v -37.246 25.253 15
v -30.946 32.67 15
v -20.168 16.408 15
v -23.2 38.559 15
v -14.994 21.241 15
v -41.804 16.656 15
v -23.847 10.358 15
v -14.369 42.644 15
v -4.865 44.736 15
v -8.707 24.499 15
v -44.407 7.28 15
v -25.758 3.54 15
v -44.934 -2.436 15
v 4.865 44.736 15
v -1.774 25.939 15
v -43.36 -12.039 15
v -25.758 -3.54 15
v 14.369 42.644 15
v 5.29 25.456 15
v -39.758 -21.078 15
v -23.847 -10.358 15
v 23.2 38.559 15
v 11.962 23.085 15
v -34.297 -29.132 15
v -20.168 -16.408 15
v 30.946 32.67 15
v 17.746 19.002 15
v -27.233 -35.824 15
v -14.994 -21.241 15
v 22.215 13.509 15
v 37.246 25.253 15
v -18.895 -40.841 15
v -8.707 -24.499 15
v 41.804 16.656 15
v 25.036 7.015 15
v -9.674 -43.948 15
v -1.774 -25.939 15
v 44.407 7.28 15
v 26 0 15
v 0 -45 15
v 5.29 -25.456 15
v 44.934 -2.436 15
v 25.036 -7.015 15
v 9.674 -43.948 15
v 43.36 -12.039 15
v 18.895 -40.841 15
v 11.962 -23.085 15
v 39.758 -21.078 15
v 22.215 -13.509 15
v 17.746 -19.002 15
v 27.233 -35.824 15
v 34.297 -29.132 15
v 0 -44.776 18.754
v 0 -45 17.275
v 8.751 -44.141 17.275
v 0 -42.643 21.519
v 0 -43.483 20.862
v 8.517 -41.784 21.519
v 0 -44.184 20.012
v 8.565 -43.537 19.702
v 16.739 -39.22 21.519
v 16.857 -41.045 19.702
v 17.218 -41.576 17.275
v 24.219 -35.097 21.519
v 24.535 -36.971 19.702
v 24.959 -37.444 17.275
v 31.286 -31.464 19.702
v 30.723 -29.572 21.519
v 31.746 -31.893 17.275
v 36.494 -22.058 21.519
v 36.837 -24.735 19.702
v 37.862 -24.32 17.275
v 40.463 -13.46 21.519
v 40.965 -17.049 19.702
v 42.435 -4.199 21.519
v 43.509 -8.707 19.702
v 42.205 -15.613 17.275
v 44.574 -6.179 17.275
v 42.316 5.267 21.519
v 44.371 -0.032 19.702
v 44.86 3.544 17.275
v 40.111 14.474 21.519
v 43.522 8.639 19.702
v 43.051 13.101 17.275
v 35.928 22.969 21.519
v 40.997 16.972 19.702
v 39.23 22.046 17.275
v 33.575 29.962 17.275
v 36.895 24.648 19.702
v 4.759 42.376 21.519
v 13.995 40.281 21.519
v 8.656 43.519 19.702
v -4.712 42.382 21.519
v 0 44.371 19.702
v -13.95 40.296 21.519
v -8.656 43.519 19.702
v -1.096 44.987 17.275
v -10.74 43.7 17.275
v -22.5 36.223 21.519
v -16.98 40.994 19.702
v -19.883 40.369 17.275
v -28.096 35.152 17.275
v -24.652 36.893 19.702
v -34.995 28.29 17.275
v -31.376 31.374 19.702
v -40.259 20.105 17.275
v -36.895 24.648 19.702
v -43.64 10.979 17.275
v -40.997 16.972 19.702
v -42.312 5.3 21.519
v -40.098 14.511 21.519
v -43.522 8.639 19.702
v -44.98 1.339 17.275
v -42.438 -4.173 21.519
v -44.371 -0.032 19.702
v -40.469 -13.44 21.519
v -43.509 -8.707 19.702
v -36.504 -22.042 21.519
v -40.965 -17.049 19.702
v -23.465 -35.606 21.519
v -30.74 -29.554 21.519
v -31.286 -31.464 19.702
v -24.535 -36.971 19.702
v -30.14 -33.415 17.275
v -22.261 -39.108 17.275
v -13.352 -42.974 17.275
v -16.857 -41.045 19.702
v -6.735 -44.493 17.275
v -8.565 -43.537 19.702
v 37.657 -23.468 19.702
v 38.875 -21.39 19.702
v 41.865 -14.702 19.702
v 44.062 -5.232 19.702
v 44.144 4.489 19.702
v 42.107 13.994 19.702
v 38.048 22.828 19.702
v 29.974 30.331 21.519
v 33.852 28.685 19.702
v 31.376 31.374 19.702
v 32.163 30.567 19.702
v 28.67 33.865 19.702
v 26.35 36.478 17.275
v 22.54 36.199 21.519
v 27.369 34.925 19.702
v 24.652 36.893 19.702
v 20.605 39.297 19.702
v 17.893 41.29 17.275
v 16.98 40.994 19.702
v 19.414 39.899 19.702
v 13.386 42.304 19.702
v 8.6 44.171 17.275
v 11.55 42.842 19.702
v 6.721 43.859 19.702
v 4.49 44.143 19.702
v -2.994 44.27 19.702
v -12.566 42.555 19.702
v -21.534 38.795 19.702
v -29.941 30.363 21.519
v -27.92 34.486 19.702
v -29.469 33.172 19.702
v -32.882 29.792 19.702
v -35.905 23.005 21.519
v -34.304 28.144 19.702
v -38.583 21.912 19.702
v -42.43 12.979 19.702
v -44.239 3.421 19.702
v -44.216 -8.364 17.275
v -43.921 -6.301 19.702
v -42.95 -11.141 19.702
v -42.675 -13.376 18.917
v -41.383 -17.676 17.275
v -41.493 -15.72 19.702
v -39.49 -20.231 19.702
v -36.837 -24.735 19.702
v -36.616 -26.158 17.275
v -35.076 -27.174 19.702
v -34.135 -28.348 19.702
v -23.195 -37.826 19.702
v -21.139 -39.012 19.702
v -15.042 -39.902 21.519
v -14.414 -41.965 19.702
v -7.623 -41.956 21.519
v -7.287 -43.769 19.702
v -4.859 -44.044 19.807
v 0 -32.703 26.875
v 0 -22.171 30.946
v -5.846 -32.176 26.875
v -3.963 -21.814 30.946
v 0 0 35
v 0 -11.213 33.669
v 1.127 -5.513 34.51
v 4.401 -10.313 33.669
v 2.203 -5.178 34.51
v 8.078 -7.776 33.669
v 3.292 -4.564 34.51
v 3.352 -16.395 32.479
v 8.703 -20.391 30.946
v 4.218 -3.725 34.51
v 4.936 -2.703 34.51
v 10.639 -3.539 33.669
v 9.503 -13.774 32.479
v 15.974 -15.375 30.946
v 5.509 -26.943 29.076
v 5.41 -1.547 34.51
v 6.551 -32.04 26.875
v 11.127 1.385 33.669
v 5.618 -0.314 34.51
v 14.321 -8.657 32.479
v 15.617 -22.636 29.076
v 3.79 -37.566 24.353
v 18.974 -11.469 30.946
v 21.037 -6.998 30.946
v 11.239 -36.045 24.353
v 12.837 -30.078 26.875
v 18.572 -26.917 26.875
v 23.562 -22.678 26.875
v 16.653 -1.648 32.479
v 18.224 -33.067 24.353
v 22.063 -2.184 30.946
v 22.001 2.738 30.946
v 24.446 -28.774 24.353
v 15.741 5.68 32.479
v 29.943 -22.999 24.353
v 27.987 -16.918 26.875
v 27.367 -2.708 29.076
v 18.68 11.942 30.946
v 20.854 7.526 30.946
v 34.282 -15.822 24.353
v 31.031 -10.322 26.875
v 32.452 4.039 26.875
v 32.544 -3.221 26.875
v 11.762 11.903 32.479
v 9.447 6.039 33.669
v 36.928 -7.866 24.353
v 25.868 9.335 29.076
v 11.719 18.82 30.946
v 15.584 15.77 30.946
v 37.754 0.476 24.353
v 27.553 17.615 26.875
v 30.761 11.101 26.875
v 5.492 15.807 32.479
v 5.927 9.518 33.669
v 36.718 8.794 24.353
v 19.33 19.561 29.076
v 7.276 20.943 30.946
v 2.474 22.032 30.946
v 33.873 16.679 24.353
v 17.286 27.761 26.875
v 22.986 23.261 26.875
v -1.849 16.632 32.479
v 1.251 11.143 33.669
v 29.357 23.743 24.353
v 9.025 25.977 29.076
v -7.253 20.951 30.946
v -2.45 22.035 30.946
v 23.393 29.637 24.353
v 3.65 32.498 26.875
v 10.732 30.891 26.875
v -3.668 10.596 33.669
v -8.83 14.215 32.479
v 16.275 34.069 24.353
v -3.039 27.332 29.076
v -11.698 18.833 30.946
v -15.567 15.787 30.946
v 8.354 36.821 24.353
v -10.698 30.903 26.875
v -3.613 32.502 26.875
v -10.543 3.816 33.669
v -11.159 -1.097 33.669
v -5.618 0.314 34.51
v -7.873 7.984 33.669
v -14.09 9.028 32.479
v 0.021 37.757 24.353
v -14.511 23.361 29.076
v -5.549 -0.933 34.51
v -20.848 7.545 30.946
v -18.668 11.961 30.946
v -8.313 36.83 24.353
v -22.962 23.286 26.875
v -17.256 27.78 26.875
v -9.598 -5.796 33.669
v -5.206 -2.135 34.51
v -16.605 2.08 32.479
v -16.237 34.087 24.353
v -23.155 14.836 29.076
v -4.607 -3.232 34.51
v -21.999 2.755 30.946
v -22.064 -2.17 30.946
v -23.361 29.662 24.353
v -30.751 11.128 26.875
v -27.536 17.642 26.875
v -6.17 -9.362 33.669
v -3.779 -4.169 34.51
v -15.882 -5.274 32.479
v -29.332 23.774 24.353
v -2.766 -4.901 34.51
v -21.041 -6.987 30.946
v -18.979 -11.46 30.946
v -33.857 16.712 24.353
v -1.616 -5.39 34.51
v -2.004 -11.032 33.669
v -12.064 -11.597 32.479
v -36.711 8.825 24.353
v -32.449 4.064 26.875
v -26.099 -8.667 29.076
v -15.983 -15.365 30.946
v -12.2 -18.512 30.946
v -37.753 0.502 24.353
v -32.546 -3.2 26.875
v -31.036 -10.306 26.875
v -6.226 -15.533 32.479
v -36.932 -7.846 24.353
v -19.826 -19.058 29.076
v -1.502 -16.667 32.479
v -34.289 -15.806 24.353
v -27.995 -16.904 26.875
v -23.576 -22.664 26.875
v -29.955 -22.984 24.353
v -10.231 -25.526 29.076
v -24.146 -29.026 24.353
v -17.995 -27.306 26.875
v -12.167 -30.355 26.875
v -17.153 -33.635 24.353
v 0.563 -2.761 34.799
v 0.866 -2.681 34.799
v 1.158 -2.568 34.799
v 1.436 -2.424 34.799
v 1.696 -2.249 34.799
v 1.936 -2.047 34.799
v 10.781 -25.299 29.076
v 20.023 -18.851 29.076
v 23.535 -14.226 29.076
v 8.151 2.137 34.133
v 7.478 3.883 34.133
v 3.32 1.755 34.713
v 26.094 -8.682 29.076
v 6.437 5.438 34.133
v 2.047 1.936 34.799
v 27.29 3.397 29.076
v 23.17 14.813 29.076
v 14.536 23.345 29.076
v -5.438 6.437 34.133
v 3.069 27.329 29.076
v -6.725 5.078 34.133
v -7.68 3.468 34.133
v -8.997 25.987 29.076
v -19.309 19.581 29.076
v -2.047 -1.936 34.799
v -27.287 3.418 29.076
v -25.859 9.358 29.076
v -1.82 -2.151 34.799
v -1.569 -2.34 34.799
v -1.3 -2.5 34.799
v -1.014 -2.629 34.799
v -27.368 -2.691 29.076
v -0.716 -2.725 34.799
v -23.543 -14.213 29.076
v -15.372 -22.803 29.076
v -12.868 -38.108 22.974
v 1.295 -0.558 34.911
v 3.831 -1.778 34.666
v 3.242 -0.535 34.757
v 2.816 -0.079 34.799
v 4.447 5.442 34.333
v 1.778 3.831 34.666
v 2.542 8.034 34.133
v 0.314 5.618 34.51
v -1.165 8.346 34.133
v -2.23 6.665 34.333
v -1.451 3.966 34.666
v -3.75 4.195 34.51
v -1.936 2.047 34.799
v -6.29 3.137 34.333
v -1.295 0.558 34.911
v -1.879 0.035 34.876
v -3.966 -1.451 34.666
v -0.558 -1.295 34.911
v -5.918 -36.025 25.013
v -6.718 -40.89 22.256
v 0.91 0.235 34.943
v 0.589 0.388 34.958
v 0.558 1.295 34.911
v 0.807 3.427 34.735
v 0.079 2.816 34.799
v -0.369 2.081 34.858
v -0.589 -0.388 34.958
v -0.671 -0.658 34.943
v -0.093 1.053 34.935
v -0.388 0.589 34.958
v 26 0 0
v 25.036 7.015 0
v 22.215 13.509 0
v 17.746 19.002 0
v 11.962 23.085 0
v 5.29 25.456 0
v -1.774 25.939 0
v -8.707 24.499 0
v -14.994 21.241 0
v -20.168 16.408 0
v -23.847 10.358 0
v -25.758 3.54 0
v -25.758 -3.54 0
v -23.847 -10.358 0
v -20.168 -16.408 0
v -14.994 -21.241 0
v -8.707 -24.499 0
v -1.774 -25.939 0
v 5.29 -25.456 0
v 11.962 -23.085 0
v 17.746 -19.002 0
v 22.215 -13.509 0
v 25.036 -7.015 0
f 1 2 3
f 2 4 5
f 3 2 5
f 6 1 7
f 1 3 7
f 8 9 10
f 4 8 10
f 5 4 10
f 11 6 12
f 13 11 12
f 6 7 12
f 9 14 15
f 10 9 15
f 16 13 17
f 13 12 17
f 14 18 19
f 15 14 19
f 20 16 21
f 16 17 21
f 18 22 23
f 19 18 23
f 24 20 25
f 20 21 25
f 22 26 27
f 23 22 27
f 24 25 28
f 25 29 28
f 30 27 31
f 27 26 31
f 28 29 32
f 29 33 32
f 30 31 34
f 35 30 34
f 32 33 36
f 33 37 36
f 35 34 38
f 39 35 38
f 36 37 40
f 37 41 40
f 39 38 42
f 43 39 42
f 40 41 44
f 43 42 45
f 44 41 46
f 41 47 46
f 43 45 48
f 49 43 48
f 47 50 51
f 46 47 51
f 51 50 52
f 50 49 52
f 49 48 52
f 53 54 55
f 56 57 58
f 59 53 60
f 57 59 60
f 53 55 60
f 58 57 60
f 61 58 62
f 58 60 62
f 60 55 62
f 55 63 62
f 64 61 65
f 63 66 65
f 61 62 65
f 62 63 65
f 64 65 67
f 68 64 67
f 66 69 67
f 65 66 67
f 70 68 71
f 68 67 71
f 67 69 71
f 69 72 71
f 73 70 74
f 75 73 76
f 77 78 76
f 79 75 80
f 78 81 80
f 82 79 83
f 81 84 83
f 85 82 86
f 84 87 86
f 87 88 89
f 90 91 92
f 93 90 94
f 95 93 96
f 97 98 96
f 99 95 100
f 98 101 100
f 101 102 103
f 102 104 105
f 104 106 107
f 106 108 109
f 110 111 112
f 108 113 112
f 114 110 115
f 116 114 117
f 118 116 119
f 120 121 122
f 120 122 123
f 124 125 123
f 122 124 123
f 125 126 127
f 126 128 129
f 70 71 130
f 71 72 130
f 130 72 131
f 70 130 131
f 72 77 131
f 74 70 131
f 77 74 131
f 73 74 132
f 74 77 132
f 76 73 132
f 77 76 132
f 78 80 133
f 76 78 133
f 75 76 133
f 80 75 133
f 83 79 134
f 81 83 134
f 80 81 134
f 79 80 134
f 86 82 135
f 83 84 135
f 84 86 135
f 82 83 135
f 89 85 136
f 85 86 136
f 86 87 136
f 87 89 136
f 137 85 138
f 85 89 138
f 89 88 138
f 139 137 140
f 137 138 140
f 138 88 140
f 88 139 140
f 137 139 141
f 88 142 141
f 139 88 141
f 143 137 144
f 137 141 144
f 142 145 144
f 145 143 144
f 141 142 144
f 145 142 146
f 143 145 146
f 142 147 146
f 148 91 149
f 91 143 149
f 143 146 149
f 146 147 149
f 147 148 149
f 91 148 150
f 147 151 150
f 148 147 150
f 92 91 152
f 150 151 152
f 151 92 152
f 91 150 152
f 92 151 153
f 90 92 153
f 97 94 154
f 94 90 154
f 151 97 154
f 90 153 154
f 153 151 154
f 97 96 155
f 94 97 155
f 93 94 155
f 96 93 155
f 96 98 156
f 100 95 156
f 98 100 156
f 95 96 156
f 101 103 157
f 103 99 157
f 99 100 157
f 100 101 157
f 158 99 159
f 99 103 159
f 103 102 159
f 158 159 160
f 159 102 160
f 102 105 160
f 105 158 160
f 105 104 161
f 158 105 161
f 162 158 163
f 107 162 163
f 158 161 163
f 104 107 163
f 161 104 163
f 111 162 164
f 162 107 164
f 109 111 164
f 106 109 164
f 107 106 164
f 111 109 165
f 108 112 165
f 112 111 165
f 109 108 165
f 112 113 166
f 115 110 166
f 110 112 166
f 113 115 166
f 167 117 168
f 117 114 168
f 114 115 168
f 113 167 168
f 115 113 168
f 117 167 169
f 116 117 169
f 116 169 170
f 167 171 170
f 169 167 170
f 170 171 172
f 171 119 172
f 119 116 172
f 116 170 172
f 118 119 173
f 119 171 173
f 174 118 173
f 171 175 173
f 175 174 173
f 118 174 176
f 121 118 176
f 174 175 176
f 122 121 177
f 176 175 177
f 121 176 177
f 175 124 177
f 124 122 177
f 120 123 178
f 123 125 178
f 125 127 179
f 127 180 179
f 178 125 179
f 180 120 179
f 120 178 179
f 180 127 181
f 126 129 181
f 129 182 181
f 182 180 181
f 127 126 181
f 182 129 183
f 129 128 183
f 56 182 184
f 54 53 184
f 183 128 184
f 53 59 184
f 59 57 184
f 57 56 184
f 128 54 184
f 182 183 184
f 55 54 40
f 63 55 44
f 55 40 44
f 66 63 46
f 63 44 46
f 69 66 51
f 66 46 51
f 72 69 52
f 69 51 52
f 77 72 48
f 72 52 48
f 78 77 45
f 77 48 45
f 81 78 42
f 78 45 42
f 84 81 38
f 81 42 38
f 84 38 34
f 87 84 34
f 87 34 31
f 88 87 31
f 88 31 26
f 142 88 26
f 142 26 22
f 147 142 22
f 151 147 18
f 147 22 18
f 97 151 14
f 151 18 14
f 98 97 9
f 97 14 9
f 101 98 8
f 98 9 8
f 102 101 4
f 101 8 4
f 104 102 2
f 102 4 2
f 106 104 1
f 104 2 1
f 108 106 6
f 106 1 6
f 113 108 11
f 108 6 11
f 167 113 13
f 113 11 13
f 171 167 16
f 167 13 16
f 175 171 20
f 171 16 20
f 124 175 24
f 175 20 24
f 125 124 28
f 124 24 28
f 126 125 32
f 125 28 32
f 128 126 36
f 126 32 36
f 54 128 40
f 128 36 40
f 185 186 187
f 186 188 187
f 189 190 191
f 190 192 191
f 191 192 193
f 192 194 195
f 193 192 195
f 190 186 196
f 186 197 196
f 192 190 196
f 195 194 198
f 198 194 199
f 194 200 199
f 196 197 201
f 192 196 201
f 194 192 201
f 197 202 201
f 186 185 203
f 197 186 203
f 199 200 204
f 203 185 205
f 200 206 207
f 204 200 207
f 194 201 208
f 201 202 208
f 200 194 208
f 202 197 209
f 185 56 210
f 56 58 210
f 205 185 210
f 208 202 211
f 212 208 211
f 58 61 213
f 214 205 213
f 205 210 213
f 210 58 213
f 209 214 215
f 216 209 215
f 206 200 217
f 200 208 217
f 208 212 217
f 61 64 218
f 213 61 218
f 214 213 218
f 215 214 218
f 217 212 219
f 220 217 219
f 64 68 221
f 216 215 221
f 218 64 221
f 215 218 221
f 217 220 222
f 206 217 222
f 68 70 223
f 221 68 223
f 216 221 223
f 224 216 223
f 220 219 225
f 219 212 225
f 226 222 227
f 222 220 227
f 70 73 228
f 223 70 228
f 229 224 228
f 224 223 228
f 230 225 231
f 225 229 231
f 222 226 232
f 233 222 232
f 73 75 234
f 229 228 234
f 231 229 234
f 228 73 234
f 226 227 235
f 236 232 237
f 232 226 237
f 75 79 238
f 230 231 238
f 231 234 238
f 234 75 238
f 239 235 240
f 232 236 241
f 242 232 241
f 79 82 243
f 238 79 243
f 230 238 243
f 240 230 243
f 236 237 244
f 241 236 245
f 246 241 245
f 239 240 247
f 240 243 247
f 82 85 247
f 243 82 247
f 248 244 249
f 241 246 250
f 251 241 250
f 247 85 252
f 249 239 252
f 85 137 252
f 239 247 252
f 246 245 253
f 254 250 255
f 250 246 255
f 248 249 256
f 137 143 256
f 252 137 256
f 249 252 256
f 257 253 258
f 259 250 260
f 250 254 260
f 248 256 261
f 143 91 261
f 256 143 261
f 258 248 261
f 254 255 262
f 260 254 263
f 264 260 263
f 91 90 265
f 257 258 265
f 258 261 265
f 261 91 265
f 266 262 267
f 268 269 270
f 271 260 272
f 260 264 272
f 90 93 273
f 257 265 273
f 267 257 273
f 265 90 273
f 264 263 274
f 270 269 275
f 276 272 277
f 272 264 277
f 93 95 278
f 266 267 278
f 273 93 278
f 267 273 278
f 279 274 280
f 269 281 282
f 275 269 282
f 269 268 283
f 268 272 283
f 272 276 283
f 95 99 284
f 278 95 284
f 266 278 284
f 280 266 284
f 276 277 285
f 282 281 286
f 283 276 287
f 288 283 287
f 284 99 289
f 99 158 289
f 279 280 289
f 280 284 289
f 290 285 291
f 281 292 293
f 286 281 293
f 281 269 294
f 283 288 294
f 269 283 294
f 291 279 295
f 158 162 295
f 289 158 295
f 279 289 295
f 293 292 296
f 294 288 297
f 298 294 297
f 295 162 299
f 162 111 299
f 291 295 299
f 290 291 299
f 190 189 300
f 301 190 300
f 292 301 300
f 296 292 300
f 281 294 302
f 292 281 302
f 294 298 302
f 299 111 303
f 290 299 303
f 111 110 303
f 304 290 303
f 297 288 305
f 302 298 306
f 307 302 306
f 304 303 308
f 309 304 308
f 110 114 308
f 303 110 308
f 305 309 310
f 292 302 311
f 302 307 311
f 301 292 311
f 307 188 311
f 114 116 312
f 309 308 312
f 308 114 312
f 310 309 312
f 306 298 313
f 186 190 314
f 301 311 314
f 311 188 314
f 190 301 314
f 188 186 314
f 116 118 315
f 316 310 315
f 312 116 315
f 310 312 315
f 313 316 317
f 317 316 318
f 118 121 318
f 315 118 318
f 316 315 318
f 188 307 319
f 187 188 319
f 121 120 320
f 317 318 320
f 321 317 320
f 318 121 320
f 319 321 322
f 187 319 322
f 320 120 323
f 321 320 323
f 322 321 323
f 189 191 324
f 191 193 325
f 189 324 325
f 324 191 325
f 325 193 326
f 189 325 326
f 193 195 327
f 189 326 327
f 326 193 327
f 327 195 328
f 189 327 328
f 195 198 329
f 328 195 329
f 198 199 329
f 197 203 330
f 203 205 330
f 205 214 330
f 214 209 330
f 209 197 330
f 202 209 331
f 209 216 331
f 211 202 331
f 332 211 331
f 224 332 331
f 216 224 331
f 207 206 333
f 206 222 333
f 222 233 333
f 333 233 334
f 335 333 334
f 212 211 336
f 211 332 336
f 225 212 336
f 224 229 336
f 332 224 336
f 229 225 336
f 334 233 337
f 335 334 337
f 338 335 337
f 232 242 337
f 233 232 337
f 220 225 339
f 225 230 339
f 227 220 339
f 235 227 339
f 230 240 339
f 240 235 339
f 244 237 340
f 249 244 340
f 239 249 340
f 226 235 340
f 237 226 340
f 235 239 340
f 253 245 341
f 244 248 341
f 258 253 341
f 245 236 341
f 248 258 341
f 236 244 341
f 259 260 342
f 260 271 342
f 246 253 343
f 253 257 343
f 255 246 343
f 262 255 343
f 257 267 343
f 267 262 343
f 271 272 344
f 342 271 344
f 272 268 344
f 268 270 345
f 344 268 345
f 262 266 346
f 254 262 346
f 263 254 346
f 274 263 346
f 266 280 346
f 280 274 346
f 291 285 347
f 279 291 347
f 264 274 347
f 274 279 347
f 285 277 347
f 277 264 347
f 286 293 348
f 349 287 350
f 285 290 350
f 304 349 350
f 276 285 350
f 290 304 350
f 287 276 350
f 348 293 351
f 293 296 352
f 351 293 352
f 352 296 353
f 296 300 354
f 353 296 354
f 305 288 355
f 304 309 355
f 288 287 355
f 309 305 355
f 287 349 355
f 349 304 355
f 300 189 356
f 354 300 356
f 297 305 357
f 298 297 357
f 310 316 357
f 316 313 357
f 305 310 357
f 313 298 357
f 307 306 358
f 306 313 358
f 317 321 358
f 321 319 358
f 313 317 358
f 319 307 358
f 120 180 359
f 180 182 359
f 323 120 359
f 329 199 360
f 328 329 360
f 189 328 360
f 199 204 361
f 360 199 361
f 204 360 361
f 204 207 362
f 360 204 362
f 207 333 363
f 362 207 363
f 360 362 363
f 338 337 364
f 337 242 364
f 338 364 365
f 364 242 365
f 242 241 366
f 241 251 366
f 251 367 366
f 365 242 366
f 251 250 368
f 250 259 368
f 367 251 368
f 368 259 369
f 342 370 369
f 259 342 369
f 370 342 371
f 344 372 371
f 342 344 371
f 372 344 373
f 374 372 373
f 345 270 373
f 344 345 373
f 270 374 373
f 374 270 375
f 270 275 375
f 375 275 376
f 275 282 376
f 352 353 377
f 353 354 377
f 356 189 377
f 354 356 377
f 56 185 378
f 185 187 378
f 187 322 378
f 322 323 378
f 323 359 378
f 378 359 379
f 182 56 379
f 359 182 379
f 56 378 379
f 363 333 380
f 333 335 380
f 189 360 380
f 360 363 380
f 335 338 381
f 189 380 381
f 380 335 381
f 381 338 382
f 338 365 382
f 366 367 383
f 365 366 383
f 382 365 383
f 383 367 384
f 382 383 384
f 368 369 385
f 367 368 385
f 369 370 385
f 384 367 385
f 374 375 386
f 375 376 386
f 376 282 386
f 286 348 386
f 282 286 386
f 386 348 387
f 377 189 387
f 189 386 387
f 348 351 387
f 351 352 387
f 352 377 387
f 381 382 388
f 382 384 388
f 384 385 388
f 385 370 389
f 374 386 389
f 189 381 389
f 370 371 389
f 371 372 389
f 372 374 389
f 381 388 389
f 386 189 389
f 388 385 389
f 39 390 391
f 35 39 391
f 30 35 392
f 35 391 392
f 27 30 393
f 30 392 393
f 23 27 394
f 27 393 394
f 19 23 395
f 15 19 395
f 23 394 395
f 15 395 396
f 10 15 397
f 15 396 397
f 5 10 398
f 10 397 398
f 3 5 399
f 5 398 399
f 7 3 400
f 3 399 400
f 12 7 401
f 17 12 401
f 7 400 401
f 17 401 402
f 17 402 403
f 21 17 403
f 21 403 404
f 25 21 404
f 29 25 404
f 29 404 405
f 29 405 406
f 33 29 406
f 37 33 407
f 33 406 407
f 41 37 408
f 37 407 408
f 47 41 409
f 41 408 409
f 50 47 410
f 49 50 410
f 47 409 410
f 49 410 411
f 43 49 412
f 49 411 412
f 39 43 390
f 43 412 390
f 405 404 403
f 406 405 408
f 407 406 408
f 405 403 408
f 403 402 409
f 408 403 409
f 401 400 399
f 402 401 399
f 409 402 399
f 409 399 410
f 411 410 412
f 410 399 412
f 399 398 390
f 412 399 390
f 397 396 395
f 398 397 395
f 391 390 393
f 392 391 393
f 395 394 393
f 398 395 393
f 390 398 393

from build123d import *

# Parameters (mm, degrees)
F0_R     = 26
F1_DEPTH = 15
F4_R     = 5


with BuildPart() as f1:
    # F0 (on Top) → F1 (new body)
    with BuildSketch(Plane.XY):
        Circle(F0_R)
    extrude(amount=F1_DEPTH)

    # F2 (on Right) → F3 (revolve)
    with BuildSketch(Plane.YZ):
        with BuildLine():
            Line((-45, 15), (0, 15))
            Line((0, 15), (0, 35))
            ThreePointArc((0, 35), (-23.504386, 30.513157), (-45, 20))
            Line((-45, 20), (-45, 15))
        make_face()
    revolve(axis=Axis((0, 0, 37.347408), (0, 0, 1)))

    # F4
    f4_edges = [f1.edges().sort_by_distance(p)[0] for p in [
        (0, 45, 20),
    ]]
    fillet(f4_edges, radius=F4_R)


solid = f1.part
